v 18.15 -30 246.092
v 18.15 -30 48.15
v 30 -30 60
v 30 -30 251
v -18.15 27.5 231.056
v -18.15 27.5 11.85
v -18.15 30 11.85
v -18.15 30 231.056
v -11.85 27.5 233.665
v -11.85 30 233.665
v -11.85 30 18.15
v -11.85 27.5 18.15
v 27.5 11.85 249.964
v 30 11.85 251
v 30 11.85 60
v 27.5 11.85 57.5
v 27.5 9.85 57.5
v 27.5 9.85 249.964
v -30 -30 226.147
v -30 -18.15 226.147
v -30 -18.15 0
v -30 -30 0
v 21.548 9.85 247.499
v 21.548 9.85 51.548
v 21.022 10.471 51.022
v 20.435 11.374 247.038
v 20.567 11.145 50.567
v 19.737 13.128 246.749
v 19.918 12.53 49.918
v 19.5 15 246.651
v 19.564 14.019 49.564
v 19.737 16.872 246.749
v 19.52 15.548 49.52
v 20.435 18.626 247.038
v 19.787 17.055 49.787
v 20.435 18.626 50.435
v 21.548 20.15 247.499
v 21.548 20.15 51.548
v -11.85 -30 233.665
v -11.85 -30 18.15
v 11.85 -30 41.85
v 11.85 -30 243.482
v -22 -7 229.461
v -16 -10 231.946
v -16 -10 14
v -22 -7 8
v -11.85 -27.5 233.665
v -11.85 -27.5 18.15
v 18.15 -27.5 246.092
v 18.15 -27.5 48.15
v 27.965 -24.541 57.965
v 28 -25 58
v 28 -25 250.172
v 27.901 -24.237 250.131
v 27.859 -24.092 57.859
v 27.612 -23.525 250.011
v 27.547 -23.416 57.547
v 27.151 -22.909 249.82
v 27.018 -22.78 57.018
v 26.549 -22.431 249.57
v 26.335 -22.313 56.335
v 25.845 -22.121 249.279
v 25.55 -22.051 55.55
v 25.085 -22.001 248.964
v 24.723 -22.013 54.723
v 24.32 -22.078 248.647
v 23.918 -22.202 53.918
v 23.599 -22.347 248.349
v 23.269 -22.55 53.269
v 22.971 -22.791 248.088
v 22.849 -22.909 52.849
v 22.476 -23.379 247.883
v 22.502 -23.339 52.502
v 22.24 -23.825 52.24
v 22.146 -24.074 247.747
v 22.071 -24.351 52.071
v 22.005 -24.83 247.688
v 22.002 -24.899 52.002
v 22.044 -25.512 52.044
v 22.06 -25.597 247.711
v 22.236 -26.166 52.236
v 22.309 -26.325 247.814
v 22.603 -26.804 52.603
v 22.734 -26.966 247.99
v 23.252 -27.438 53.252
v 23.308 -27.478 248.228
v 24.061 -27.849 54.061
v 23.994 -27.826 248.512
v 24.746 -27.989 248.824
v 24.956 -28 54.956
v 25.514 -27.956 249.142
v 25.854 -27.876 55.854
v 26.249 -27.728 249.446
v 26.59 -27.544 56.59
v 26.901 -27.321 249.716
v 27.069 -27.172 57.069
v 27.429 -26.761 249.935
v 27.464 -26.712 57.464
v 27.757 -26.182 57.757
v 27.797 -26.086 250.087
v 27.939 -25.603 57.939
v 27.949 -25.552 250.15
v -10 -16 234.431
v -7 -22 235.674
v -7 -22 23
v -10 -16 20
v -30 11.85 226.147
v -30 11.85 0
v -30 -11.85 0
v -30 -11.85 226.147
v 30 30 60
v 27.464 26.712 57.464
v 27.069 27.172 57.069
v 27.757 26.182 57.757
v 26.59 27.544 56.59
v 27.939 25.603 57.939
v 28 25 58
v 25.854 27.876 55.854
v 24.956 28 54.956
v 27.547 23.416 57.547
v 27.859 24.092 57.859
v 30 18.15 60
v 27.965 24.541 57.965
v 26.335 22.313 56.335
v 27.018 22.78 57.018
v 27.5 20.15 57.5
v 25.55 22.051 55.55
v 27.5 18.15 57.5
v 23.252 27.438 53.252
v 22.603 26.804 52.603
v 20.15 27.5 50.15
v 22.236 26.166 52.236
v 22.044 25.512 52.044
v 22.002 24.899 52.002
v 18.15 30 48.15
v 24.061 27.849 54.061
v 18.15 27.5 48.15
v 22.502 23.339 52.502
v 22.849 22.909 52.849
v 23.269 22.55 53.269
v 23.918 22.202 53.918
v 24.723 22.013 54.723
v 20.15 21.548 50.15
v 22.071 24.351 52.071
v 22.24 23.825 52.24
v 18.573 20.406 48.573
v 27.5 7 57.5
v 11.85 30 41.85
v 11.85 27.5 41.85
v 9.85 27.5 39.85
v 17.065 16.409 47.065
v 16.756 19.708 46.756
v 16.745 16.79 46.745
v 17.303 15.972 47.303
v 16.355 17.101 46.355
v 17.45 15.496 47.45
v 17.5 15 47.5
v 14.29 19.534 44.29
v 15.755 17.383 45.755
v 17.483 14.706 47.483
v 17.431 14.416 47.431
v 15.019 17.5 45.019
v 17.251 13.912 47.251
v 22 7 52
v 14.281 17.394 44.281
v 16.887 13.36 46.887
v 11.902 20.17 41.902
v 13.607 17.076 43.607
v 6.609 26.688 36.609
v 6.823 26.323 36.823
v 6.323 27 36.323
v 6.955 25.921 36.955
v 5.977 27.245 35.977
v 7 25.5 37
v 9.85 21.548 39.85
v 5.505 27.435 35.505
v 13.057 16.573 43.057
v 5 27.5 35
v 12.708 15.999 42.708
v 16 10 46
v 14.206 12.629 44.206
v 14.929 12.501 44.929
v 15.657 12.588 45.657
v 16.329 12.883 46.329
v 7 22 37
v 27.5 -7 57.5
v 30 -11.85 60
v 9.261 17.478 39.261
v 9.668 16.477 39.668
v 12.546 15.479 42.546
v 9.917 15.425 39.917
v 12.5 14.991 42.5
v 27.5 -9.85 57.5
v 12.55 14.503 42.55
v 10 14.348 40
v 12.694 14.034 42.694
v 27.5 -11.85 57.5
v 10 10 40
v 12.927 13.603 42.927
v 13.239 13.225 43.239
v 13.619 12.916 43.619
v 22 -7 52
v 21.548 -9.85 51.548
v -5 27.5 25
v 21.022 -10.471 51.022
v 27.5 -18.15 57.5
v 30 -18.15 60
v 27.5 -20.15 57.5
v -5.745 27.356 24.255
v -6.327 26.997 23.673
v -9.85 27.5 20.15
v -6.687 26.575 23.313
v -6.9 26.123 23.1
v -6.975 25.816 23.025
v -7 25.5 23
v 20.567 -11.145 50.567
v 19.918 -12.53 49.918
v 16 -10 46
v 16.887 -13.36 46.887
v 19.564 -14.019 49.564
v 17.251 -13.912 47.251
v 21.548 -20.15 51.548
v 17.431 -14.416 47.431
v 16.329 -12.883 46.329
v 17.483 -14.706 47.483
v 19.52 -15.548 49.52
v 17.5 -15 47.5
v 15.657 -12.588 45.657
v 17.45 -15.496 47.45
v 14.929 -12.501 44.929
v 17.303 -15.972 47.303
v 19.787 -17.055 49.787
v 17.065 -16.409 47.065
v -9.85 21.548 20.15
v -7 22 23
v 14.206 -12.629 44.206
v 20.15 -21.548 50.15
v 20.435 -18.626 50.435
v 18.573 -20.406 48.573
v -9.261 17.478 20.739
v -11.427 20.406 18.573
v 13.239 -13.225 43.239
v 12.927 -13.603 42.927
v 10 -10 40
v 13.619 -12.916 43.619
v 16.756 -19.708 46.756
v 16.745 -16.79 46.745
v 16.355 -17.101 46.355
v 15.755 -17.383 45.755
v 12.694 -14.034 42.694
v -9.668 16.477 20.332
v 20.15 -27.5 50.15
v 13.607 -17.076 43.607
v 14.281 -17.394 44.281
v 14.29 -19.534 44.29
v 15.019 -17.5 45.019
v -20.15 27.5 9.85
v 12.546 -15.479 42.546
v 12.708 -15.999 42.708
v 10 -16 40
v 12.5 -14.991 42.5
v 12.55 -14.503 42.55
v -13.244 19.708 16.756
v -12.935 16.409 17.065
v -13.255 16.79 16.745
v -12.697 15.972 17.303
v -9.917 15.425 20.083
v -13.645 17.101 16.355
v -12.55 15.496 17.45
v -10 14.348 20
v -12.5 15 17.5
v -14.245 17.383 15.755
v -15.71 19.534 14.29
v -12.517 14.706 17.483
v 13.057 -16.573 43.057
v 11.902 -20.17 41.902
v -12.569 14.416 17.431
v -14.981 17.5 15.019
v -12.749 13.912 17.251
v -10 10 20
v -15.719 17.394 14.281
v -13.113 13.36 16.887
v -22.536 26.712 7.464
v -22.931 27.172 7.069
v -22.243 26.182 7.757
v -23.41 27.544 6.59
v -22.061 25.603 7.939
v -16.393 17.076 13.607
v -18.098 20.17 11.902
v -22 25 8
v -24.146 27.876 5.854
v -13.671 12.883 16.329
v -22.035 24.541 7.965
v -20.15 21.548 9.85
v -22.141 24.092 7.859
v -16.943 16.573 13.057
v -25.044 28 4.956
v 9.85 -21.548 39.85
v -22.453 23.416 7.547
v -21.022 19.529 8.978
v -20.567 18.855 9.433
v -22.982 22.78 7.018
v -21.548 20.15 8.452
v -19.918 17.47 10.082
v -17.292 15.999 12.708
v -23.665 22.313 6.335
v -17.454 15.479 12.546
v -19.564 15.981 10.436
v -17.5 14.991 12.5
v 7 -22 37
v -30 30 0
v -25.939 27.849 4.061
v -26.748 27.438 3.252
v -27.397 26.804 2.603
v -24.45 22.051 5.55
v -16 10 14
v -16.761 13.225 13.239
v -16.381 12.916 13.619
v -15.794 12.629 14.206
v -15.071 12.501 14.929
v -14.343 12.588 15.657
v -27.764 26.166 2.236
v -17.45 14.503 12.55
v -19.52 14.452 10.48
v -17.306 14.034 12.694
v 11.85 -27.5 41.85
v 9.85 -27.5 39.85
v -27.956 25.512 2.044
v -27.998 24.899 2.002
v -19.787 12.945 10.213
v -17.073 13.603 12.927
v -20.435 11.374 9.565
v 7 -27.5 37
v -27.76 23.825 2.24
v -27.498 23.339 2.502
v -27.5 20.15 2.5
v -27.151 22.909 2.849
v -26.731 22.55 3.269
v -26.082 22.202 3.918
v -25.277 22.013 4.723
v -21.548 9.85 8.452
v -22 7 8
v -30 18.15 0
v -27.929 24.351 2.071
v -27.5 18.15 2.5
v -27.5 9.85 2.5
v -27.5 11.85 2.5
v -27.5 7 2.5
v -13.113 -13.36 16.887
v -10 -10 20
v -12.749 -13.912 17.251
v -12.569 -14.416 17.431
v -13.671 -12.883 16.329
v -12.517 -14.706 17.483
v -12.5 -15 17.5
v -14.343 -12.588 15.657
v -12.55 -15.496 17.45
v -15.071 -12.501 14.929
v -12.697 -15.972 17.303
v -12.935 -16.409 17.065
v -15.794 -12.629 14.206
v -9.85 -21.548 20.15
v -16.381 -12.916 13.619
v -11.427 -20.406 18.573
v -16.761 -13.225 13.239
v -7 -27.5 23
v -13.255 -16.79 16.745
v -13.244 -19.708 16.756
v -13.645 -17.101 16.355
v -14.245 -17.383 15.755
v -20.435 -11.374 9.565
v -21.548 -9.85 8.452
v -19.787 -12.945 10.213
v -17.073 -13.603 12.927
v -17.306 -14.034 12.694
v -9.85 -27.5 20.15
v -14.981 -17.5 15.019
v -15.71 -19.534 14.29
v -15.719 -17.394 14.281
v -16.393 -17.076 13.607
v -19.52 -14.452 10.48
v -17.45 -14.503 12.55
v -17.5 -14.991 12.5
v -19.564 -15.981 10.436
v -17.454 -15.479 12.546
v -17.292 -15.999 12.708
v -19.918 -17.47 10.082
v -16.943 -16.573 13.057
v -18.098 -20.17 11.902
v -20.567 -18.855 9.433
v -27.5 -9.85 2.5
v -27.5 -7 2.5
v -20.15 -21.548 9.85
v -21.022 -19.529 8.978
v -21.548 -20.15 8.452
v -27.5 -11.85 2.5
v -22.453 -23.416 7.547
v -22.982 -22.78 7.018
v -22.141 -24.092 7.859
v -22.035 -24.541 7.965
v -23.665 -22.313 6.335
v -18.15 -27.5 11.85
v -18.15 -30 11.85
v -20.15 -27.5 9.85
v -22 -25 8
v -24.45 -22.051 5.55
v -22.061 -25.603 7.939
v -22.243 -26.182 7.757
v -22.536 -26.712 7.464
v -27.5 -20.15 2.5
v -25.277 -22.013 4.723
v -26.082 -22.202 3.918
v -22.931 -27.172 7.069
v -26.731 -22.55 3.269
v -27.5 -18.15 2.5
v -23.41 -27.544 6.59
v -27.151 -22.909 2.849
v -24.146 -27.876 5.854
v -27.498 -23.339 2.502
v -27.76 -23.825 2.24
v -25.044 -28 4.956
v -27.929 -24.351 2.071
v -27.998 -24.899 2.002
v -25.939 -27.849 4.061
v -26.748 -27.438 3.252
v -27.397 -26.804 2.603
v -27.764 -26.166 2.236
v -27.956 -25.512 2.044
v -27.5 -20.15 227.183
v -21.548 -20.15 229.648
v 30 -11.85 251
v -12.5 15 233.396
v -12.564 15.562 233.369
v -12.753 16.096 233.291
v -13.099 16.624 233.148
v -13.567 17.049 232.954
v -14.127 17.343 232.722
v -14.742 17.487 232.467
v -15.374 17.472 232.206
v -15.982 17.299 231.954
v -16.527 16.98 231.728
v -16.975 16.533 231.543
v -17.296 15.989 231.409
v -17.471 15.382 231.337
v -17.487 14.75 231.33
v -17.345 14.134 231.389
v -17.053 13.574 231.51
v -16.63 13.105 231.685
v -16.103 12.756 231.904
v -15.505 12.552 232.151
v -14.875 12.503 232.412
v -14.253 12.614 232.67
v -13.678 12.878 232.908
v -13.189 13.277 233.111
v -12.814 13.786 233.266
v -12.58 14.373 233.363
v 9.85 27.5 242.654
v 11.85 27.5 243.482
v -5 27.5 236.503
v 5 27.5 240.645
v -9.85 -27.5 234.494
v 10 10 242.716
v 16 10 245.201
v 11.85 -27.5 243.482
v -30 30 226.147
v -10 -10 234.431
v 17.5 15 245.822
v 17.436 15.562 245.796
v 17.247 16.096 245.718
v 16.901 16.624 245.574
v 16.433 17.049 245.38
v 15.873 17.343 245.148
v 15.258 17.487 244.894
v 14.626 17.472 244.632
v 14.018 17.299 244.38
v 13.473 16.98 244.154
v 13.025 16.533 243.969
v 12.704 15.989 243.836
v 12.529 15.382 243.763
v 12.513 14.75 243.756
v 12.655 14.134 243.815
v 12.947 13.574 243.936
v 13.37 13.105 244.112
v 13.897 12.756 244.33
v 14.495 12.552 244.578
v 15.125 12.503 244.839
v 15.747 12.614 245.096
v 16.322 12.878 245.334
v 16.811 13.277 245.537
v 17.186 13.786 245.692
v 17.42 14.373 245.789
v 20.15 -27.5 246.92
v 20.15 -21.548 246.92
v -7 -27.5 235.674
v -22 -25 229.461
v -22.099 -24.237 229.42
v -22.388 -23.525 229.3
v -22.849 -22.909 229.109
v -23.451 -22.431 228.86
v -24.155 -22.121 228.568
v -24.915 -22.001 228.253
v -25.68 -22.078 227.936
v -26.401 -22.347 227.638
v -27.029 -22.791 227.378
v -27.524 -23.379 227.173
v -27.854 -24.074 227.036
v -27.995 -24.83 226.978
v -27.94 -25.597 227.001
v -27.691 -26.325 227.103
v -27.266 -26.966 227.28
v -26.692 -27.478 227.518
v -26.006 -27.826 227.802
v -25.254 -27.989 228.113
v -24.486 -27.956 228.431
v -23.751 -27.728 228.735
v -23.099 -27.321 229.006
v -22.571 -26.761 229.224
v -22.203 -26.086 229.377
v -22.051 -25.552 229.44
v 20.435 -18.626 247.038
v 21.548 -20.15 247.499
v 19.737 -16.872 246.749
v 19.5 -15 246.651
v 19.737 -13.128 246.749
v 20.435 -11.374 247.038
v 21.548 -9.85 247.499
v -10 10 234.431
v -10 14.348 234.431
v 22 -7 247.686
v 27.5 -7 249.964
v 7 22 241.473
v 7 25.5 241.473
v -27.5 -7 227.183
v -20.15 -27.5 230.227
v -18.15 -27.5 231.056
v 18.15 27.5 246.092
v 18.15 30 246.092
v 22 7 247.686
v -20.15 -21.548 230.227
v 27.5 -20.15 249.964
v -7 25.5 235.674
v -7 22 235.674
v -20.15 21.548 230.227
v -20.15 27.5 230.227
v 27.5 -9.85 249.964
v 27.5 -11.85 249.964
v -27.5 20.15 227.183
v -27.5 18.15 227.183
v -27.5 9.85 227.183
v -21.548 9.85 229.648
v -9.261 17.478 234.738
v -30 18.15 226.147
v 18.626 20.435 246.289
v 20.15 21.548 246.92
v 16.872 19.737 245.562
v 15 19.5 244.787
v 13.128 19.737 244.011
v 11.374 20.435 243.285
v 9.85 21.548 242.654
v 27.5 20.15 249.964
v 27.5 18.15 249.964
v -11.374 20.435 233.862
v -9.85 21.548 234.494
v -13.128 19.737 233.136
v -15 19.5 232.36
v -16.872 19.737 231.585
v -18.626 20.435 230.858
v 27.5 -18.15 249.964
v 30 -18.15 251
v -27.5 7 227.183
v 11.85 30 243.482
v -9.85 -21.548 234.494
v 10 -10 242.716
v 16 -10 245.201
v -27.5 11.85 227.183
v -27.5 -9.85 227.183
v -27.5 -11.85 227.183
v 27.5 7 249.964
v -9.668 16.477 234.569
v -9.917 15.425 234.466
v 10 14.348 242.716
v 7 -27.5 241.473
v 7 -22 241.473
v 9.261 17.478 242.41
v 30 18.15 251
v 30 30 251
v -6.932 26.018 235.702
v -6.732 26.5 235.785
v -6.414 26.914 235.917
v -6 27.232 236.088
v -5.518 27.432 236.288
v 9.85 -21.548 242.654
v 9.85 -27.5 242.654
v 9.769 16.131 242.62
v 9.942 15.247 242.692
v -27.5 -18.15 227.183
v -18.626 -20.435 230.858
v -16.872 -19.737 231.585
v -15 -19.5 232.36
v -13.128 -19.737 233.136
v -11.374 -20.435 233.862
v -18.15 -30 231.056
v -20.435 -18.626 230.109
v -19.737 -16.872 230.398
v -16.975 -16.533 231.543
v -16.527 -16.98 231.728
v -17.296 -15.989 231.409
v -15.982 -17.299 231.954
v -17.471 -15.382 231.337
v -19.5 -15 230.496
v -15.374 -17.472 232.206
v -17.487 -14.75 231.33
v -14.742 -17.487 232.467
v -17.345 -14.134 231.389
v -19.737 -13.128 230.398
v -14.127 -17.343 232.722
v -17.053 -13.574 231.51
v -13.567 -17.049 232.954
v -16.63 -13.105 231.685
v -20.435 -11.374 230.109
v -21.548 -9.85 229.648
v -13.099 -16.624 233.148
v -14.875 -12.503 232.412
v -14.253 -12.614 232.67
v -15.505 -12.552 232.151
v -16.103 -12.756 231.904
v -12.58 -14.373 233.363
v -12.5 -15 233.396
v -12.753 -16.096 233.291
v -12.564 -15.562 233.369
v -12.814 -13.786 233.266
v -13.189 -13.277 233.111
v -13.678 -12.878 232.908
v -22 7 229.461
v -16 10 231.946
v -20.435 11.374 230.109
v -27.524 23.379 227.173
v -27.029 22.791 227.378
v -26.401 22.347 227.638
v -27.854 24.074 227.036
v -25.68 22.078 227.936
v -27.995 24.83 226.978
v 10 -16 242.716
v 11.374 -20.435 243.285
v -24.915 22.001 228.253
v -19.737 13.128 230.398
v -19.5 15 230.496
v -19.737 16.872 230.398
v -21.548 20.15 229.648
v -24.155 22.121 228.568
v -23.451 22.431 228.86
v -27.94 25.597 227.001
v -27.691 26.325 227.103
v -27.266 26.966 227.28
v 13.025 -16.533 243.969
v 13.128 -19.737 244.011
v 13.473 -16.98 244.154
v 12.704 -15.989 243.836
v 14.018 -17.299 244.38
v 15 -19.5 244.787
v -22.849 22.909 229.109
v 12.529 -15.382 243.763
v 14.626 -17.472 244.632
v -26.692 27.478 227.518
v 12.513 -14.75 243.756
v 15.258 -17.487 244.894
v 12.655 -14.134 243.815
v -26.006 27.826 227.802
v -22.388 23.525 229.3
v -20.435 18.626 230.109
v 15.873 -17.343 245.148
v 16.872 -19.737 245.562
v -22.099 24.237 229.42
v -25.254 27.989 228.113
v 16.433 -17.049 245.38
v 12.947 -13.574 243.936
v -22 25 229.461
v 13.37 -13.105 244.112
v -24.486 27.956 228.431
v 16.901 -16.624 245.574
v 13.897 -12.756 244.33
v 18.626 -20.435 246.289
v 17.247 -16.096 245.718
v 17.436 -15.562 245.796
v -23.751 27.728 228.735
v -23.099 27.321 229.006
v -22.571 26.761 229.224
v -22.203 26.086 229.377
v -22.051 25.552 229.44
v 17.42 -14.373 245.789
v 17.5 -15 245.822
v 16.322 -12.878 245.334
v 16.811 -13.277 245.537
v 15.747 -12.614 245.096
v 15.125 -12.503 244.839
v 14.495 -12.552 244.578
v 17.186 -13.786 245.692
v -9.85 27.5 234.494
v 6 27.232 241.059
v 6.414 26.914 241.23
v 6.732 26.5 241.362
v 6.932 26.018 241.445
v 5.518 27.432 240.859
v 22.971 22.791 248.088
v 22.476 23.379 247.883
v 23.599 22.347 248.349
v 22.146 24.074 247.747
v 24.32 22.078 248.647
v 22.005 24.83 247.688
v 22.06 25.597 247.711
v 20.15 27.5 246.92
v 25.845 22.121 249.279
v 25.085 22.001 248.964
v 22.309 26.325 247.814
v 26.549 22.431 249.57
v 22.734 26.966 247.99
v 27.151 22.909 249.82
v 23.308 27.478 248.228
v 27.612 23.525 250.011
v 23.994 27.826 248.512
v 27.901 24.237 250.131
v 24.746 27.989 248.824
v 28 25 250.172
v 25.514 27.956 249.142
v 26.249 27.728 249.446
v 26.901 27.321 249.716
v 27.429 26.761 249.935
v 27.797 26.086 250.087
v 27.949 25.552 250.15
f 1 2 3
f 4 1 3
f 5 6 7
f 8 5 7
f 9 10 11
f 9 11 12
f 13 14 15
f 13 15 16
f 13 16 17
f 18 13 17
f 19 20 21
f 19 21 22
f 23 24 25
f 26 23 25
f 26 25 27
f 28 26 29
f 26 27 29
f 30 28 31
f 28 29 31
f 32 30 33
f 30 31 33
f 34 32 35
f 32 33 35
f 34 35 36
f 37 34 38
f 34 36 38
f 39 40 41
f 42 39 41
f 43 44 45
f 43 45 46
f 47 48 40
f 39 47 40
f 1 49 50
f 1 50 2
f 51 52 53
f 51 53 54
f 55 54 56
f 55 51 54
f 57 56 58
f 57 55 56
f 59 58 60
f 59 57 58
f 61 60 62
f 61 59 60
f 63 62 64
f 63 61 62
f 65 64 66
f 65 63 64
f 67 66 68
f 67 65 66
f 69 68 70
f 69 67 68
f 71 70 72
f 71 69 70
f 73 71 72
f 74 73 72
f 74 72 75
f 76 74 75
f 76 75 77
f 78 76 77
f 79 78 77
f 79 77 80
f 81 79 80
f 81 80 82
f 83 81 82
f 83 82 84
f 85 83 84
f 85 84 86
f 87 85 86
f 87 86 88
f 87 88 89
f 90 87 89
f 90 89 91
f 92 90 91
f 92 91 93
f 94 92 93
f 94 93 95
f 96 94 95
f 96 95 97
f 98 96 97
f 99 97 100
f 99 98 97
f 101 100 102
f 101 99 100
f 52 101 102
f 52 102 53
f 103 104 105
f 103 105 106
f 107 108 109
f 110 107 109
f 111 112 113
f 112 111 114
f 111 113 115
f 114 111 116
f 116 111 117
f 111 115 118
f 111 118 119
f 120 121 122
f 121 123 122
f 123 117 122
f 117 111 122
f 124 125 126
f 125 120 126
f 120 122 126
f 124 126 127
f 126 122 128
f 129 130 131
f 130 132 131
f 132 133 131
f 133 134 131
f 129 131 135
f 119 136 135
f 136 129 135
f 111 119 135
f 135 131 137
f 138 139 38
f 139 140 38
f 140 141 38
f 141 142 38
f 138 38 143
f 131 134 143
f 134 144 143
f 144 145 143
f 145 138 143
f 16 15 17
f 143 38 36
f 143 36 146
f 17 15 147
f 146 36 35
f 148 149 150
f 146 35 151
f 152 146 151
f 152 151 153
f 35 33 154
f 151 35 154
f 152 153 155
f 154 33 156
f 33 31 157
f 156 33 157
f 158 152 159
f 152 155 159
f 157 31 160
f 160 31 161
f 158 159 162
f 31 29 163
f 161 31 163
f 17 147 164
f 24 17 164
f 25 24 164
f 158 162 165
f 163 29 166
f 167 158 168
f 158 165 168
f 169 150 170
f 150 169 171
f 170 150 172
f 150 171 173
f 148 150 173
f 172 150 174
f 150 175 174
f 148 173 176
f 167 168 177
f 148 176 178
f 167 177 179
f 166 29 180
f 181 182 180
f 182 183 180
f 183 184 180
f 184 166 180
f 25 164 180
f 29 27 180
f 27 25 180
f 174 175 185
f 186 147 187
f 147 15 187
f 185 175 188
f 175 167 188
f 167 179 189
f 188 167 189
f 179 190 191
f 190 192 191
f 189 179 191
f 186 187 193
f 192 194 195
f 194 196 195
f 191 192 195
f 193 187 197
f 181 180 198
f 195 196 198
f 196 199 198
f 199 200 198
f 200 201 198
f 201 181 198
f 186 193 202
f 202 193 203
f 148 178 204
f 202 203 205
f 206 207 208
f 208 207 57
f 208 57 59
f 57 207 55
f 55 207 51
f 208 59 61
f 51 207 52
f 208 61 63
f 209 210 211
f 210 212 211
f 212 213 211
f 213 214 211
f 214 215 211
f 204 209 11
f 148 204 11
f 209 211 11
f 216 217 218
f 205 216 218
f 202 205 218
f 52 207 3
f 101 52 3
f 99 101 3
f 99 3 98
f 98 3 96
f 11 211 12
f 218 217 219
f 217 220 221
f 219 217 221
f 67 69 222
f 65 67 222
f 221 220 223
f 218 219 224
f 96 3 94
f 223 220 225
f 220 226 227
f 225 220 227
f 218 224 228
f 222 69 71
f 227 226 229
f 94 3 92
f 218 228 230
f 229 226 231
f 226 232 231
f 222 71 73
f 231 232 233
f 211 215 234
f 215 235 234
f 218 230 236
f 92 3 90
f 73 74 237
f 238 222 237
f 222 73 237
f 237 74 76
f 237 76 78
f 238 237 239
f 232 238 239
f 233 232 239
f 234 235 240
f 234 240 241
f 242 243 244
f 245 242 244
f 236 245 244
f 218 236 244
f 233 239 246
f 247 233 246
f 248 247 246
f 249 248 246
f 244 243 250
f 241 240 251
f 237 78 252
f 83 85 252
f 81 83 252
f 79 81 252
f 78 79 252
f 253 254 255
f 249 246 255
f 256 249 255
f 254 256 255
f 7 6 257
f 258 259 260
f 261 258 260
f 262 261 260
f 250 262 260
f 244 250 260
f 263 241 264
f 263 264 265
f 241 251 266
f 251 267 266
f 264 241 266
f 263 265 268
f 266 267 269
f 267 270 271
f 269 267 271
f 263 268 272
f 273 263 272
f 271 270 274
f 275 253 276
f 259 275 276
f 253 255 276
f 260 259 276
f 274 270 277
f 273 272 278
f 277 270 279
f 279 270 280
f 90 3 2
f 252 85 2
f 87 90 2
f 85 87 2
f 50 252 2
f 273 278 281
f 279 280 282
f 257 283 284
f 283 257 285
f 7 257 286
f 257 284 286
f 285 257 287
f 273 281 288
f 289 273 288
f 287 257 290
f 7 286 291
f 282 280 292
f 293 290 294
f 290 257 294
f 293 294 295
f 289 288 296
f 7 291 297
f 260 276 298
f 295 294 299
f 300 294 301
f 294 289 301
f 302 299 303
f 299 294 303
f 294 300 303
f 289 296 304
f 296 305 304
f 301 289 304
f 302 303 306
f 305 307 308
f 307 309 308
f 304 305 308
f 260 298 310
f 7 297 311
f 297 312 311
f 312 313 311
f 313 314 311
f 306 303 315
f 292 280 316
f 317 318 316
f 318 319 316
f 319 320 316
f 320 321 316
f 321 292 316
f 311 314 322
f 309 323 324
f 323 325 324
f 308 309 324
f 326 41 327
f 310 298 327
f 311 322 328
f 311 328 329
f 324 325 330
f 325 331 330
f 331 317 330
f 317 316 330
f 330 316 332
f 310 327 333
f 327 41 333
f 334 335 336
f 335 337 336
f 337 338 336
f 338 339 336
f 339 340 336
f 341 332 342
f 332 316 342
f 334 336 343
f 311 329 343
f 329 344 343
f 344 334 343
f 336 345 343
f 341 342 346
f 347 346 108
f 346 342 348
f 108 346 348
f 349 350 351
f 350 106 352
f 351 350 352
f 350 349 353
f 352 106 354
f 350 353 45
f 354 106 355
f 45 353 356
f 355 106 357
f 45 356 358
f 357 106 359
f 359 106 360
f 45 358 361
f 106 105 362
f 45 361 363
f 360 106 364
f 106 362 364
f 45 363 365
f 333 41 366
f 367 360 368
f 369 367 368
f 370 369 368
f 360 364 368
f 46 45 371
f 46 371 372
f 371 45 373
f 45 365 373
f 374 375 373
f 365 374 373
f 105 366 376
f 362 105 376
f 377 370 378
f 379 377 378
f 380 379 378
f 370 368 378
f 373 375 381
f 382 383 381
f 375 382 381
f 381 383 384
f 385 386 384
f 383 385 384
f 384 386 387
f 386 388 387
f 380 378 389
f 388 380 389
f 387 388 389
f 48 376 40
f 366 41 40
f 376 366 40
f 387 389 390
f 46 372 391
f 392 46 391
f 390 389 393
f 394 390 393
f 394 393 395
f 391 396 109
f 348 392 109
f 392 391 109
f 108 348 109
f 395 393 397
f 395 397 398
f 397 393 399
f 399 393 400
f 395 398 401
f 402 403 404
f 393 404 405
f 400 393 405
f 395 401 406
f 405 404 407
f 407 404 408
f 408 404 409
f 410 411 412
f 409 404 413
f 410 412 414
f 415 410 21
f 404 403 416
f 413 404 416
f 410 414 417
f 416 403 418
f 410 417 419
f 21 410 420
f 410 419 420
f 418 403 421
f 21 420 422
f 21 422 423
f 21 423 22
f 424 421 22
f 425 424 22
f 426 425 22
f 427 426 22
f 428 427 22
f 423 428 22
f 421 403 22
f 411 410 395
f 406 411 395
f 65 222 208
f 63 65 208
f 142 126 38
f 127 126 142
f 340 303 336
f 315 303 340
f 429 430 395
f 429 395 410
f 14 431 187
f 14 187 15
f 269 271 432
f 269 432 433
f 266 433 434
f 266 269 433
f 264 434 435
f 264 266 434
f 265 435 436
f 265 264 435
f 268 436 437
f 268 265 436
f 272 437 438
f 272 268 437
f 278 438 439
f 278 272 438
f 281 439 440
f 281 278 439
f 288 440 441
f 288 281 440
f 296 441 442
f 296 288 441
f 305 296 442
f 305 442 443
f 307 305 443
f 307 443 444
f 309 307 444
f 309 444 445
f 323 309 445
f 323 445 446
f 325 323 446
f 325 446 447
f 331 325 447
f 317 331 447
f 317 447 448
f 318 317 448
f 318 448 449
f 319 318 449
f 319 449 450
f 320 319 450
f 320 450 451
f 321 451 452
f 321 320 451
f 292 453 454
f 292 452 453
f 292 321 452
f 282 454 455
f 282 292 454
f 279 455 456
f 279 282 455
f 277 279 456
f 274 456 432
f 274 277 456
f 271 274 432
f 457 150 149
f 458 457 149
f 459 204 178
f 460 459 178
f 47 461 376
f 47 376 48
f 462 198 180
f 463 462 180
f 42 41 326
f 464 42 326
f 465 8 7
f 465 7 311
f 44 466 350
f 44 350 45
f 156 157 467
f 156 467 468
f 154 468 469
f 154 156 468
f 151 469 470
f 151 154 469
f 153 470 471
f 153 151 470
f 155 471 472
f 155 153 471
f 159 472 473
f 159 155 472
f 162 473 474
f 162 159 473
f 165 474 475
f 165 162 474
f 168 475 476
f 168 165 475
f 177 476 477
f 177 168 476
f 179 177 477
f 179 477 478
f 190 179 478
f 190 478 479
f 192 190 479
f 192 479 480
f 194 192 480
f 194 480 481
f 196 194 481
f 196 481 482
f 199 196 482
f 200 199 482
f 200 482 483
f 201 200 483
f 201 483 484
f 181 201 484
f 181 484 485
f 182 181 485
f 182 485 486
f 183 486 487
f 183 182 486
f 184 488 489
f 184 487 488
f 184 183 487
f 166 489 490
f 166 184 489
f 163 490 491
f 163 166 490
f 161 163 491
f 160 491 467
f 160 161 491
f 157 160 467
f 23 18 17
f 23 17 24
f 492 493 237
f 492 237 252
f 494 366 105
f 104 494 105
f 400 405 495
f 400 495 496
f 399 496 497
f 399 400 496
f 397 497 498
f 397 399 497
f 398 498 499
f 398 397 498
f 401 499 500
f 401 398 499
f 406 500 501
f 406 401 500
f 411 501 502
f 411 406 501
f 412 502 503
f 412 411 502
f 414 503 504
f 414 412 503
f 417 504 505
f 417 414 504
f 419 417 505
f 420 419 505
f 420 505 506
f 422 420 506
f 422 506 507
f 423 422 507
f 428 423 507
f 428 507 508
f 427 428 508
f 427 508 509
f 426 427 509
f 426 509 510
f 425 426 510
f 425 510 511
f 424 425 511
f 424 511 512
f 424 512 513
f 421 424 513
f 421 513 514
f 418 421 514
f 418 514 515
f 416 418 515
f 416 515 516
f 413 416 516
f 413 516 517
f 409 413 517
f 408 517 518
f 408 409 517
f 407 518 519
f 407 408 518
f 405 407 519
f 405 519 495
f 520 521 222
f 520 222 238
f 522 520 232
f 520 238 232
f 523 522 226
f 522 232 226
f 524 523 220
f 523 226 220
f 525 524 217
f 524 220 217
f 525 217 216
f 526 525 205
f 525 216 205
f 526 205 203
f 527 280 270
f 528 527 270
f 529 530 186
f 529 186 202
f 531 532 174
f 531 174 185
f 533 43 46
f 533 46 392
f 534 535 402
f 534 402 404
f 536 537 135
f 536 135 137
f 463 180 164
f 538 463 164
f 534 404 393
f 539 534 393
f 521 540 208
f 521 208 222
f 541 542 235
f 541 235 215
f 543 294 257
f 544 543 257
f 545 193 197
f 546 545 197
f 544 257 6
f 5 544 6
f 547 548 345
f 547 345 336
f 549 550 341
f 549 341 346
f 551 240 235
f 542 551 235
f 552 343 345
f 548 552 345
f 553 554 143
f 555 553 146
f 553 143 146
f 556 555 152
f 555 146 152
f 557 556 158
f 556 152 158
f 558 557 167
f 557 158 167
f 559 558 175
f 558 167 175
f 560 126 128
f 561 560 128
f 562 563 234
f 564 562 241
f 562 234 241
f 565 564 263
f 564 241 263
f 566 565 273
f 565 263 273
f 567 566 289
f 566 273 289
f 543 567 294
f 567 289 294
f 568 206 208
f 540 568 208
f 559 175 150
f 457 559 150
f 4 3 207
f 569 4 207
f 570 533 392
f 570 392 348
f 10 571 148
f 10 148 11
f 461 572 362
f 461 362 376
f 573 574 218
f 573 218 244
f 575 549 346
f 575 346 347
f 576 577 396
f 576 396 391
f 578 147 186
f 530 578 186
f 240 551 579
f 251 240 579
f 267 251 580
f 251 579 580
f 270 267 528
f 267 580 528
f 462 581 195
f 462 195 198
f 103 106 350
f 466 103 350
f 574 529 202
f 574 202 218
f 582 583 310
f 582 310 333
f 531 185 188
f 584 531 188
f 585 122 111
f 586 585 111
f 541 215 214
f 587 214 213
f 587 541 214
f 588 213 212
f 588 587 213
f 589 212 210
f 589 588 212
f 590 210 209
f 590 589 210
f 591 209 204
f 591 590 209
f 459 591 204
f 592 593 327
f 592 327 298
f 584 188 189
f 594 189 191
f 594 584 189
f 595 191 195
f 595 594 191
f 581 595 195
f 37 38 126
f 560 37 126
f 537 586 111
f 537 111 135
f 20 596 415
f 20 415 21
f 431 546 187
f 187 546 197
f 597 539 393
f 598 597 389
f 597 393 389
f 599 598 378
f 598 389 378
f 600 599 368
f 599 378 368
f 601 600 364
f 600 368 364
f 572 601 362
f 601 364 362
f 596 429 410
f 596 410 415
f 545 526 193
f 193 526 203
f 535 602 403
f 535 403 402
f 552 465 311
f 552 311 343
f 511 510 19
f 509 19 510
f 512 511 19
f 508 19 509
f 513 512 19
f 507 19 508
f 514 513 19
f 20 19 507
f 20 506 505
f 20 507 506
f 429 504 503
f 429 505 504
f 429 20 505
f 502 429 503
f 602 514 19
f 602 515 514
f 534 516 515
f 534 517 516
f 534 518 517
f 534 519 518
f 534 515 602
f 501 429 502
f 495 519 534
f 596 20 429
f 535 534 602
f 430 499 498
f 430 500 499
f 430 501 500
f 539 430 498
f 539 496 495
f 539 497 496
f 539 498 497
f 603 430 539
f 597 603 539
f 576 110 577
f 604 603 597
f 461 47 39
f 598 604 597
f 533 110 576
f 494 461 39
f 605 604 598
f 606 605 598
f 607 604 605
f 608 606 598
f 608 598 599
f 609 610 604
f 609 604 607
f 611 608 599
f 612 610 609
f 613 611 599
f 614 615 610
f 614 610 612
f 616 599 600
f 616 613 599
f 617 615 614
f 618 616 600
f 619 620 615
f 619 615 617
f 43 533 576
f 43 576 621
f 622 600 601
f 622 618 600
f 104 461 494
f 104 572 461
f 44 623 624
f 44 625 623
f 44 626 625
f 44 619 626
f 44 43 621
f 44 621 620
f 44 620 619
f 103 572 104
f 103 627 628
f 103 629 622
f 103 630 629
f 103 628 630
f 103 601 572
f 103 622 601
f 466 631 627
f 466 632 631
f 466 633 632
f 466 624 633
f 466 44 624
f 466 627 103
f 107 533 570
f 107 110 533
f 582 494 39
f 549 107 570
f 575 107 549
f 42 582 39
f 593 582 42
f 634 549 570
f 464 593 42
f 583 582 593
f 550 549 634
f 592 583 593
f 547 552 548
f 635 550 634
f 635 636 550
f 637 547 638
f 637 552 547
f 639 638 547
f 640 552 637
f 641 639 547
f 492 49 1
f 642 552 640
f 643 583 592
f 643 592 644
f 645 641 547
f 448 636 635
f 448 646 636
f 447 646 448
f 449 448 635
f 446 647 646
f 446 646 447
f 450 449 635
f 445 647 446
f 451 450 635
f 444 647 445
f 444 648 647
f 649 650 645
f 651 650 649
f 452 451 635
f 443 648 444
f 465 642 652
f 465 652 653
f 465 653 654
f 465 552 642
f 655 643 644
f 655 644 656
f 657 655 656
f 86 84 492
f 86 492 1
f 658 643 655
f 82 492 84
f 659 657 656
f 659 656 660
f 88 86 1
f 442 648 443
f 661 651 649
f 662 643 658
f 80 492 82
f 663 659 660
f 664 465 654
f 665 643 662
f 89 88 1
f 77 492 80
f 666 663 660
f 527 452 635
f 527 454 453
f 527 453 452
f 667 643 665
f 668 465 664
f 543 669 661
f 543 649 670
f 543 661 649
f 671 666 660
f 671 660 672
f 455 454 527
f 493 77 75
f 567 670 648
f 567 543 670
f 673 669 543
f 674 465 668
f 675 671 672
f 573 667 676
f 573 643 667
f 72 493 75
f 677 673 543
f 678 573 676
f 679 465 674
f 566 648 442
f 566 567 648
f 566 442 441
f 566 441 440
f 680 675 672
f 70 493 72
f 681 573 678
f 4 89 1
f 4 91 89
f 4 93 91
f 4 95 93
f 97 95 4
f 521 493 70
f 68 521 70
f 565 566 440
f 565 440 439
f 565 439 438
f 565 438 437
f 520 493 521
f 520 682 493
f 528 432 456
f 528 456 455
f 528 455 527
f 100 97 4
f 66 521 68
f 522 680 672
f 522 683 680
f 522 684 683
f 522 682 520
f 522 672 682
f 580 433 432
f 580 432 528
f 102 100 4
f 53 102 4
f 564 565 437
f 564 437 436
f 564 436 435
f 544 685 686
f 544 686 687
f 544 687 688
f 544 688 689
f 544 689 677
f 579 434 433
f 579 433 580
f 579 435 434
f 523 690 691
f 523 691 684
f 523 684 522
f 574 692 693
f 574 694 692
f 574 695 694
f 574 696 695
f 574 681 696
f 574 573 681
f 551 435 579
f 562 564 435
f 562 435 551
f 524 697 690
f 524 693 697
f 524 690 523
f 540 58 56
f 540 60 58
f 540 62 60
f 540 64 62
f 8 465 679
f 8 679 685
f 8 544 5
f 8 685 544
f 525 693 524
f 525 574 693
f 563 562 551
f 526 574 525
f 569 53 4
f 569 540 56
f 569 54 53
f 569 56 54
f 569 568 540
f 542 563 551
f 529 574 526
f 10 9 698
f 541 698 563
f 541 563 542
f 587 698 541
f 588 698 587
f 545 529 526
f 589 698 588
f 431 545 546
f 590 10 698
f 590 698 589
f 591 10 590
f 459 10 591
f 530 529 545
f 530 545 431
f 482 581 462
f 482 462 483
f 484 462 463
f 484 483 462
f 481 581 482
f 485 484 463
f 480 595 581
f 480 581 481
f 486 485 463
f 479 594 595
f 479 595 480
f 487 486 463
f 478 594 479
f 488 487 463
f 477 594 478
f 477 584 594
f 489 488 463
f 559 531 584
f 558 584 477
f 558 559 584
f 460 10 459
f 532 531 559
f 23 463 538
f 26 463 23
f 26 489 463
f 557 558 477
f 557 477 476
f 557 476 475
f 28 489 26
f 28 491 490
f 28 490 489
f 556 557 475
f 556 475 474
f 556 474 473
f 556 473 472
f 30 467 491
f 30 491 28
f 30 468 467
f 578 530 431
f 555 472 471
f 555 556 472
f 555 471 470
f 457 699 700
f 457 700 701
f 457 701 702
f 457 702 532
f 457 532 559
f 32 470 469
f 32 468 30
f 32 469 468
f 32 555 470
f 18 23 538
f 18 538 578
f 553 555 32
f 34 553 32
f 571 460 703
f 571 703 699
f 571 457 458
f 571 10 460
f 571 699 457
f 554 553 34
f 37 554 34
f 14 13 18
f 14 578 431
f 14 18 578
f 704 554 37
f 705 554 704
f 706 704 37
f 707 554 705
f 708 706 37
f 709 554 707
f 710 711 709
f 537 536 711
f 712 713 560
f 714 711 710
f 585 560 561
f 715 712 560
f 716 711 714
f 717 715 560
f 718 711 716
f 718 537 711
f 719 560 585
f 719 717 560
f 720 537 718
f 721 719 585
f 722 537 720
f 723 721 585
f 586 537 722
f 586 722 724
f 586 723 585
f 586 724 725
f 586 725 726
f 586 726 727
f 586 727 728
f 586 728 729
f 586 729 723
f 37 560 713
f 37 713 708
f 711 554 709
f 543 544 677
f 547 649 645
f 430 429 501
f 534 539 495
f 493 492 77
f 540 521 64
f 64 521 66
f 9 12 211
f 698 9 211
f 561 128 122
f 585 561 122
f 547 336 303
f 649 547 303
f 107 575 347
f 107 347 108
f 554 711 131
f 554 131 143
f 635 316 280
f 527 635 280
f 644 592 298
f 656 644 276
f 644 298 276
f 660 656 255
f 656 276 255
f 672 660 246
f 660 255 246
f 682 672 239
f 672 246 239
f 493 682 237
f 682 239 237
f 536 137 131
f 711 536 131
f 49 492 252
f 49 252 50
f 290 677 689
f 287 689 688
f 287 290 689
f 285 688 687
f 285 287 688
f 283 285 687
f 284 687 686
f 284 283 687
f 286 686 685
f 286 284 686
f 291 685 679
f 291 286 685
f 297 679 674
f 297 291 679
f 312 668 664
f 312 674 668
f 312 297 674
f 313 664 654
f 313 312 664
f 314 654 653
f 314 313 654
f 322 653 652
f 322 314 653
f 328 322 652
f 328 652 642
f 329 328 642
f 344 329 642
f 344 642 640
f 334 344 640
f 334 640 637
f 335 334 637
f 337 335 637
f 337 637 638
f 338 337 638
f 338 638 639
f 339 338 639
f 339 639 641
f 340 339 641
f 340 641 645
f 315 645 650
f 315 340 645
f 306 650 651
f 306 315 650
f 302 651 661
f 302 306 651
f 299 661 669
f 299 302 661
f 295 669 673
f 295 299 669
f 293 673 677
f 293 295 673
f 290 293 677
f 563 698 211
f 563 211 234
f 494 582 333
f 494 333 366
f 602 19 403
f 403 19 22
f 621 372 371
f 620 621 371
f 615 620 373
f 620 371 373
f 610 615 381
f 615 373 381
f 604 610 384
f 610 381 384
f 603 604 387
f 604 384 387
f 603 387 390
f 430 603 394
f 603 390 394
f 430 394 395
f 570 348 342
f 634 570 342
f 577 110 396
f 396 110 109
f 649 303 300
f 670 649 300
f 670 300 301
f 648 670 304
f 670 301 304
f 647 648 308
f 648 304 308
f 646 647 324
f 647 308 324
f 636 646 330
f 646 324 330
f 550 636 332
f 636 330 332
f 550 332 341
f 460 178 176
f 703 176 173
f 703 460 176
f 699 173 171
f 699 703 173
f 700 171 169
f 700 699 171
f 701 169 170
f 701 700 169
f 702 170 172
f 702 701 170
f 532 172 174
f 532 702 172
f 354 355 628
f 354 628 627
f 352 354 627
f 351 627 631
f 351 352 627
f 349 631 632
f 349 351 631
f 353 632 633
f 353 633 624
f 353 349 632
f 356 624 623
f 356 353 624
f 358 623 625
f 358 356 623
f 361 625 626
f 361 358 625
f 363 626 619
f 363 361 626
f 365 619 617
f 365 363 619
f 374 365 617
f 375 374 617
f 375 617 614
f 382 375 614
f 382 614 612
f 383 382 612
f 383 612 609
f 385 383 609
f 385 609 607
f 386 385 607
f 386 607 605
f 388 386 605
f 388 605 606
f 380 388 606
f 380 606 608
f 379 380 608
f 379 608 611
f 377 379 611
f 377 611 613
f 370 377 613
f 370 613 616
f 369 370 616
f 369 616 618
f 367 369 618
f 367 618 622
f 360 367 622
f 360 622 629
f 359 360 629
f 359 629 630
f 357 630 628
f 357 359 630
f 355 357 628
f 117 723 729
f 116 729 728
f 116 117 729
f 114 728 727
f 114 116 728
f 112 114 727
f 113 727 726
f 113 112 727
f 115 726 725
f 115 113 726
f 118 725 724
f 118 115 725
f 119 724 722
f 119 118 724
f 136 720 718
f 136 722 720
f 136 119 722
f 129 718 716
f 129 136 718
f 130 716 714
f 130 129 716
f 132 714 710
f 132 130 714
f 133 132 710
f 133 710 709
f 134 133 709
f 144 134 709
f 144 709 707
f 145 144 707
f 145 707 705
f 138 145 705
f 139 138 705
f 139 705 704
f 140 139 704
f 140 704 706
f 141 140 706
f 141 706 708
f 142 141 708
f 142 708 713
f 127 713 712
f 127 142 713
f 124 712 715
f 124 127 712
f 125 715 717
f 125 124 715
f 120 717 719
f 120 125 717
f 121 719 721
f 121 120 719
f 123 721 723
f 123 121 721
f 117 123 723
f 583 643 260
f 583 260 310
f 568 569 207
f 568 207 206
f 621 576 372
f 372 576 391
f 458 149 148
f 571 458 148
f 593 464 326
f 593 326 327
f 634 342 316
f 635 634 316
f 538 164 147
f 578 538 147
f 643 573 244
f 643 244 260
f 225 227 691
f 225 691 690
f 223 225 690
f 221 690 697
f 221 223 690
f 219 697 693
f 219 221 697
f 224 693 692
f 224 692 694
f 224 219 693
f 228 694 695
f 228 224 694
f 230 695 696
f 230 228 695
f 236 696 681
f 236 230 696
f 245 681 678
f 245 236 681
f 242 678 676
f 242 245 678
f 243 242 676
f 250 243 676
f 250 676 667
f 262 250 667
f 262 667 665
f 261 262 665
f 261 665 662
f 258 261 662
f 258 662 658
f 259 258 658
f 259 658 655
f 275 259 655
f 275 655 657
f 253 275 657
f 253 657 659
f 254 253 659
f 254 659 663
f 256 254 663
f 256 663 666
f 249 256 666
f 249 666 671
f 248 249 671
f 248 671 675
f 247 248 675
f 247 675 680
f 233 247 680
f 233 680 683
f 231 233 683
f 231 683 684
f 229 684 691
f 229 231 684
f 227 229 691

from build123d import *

# Parameters (mm, degrees)
F0_R          = 3
F0_R_2        = 2.5
F1_DEPTH      = 251
F2_R          = 2
F3_R          = 7
F6_DEPTH      = 30
F6_DEPTH_BACK = 30


# Not quite as in the source:
# - a feature names something its author has since deleted; it is built from what else it names


with BuildPart() as f1:
    # F0 (on Top) → F1 (new body)
    with BuildSketch(Plane.XY):
        with BuildLine():
            Line((18.15, -30), (30, -30))
            Line((30, -30), (30, -18.15))
            Line((30, -18.15), (27.5, -18.15))
            Line((27.5, -18.15), (27.5, -20.15))
            Line((27.5, -20.15), (21.5477069044, -20.15))
            ThreePointArc((21.5477069044, -20.15), (19.5, -15), (21.5477069044, -9.85))
            Line((21.5477069044, -9.85), (27.5, -9.85))
            Line((27.5, -9.85), (27.5, -11.85))
            Line((27.5, -11.85), (30, -11.85))
            Line((30, -11.85), (30, 11.85))
            Line((30, 11.85), (27.5, 11.85))
            Line((27.5, 11.85), (27.5, 9.85))
            Line((27.5, 9.85), (21.5477069044, 9.85))
            ThreePointArc((21.5477069044, 9.85), (19.5, 15), (21.5477069044, 20.15))
            Line((21.5477069044, 20.15), (27.5, 20.15))
            Line((27.5, 20.15), (27.5, 18.15))
            Line((27.5, 18.15), (30, 18.15))
            Line((30, 18.15), (30, 30))
            Line((30, 30), (18.15, 30))
            Line((18.15, 30), (18.15, 27.5))
            Line((18.15, 27.5), (20.15, 27.5))
            Line((20.15, 27.5), (20.15, 21.5477069044))
            ThreePointArc((20.15, 21.5477069044), (15, 19.5), (9.85, 21.5477069044))
            Line((9.85, 21.5477069044), (9.85, 27.5))
            Line((9.85, 27.5), (11.85, 27.5))
            Line((11.85, 27.5), (11.85, 30))
            Line((11.85, 30), (-11.85, 30))
            Line((-11.85, 30), (-11.85, 27.5))
            Line((-11.85, 27.5), (-9.85, 27.5))
            Line((-9.85, 27.5), (-9.85, 21.5477069044))
            ThreePointArc((-9.85, 21.5477069044), (-15, 19.5), (-20.15, 21.5477069044))
            Line((-20.15, 21.5477069044), (-20.15, 27.5))
            Line((-20.15, 27.5), (-18.15, 27.5))
            Line((-18.15, 27.5), (-18.15, 30))
            Line((-18.15, 30), (-30, 30))
            Line((-30, 30), (-30, 18.15))
            Line((-30, 18.15), (-27.5, 18.15))
            Line((-27.5, 18.15), (-27.5, 20.15))
            Line((-27.5, 20.15), (-21.5477069044, 20.15))
            ThreePointArc((-21.5477069044, 20.15), (-19.5, 15), (-21.5477069044, 9.85))
            Line((-21.5477069044, 9.85), (-27.5, 9.85))
            Line((-27.5, 9.85), (-27.5, 11.85))
            Line((-27.5, 11.85), (-30, 11.85))
            Line((-30, 11.85), (-30, -11.85))
            Line((-30, -11.85), (-27.5, -11.85))
            Line((-27.5, -11.85), (-27.5, -9.85))
            Line((-27.5, -9.85), (-21.5477069044, -9.85))
            ThreePointArc((-21.5477069044, -9.85), (-19.5, -15), (-21.5477069044, -20.15))
            Line((-21.5477069044, -20.15), (-27.5, -20.15))
            Line((-27.5, -20.15), (-27.5, -18.15))
            Line((-27.5, -18.15), (-30, -18.15))
            Line((-30, -18.15), (-30, -30))
            Line((-30, -30), (-18.15, -30))
            Line((-18.15, -30), (-18.15, -27.5))
            Line((-18.15, -27.5), (-20.15, -27.5))
            Line((-20.15, -27.5), (-20.15, -21.5477069044))
            ThreePointArc((-20.15, -21.5477069044), (-15, -19.5), (-9.85, -21.5477069044))
            Line((-9.85, -21.5477069044), (-9.85, -27.5))
            Line((-9.85, -27.5), (-11.85, -27.5))
            Line((-11.85, -27.5), (-11.85, -30))
            Line((-11.85, -30), (11.85, -30))
            Line((11.85, -30), (11.85, -27.5))
            Line((11.85, -27.5), (9.85, -27.5))
            Line((9.85, -27.5), (9.85, -21.5477069044))
            ThreePointArc((9.85, -21.5477069044), (15, -19.5), (20.15, -21.5477069044))
            Line((20.15, -21.5477069044), (20.15, -27.5))
            Line((20.15, -27.5), (18.15, -27.5))
            Line((18.15, -27.5), (18.15, -30))
        make_face()
        with Locations((-25, -25)):
            Circle(F0_R, mode=Mode.SUBTRACT)
        with Locations((-15, -15)):
            Circle(F0_R_2, mode=Mode.SUBTRACT)
        with Locations((25, -25)):
            Circle(F0_R, mode=Mode.SUBTRACT)
        with Locations((15, -15)):
            Circle(F0_R_2, mode=Mode.SUBTRACT)
        with Locations((-25, 25)):
            Circle(F0_R, mode=Mode.SUBTRACT)
        with Locations((-15, 15)):
            Circle(F0_R_2, mode=Mode.SUBTRACT)
        Polygon((-7, 22), (-7, 27.5), (0, 27.5), (7, 27.5), (7, 22), (10, 16), (10, 10), (16, 10), (22, 7), (27.5, 7), (27.5, 0), (27.5, -7), (22, -7), (16, -10), (10, -10), (10, -16), (7, -22), (7, -27.5), (0, -27.5), (-7, -27.5), (-7, -22), (-10, -16), (-10, -10), (-16, -10), (-22, -7), (-27.5, -7), (-27.5, 0), (-27.5, 7), (-22, 7), (-16, 10), (-10, 10), (-10, 16), align=None, mode=Mode.SUBTRACT)
        with Locations((15, 15)):
            Circle(F0_R_2, mode=Mode.SUBTRACT)
        with Locations((25, 25)):
            Circle(F0_R, mode=Mode.SUBTRACT)
    extrude(amount=F1_DEPTH)

    # F2
    f2_edges = [f1.edges().sort_by_distance(p)[0] for p in [
        (-7, 27.5, 125.5),
        (7, 27.5, 125.5),
    ]]
    fillet(f2_edges, radius=F2_R)

    # F3
    f3_edges = [f1.edges().sort_by_distance(p)[0] for p in [
        (-10, 16, 125.5),
        (10, 16, 125.5),
    ]]
    fillet(f3_edges, radius=F3_R)

    # F5 (on Front) → F6 (cut, two sides)
    with BuildSketch(Plane.XZ) as f6_sk:
        Polygon((-177.8936772938, 164.8876193333), (30, 251), (-52.9032198334, 451.1460776863), (-260.7968971272, 365.0336970195), align=None)
        Polygon((247.13668536, 46.6947819077), (131.9157336339, 161.9157336339), (-30, 0), (85.2209517261, -115.2209517261), align=None)
    extrude(amount=F6_DEPTH, mode=Mode.SUBTRACT)
    extrude(f6_sk.sketch, amount=-F6_DEPTH_BACK, mode=Mode.SUBTRACT)


solid = f1.part
